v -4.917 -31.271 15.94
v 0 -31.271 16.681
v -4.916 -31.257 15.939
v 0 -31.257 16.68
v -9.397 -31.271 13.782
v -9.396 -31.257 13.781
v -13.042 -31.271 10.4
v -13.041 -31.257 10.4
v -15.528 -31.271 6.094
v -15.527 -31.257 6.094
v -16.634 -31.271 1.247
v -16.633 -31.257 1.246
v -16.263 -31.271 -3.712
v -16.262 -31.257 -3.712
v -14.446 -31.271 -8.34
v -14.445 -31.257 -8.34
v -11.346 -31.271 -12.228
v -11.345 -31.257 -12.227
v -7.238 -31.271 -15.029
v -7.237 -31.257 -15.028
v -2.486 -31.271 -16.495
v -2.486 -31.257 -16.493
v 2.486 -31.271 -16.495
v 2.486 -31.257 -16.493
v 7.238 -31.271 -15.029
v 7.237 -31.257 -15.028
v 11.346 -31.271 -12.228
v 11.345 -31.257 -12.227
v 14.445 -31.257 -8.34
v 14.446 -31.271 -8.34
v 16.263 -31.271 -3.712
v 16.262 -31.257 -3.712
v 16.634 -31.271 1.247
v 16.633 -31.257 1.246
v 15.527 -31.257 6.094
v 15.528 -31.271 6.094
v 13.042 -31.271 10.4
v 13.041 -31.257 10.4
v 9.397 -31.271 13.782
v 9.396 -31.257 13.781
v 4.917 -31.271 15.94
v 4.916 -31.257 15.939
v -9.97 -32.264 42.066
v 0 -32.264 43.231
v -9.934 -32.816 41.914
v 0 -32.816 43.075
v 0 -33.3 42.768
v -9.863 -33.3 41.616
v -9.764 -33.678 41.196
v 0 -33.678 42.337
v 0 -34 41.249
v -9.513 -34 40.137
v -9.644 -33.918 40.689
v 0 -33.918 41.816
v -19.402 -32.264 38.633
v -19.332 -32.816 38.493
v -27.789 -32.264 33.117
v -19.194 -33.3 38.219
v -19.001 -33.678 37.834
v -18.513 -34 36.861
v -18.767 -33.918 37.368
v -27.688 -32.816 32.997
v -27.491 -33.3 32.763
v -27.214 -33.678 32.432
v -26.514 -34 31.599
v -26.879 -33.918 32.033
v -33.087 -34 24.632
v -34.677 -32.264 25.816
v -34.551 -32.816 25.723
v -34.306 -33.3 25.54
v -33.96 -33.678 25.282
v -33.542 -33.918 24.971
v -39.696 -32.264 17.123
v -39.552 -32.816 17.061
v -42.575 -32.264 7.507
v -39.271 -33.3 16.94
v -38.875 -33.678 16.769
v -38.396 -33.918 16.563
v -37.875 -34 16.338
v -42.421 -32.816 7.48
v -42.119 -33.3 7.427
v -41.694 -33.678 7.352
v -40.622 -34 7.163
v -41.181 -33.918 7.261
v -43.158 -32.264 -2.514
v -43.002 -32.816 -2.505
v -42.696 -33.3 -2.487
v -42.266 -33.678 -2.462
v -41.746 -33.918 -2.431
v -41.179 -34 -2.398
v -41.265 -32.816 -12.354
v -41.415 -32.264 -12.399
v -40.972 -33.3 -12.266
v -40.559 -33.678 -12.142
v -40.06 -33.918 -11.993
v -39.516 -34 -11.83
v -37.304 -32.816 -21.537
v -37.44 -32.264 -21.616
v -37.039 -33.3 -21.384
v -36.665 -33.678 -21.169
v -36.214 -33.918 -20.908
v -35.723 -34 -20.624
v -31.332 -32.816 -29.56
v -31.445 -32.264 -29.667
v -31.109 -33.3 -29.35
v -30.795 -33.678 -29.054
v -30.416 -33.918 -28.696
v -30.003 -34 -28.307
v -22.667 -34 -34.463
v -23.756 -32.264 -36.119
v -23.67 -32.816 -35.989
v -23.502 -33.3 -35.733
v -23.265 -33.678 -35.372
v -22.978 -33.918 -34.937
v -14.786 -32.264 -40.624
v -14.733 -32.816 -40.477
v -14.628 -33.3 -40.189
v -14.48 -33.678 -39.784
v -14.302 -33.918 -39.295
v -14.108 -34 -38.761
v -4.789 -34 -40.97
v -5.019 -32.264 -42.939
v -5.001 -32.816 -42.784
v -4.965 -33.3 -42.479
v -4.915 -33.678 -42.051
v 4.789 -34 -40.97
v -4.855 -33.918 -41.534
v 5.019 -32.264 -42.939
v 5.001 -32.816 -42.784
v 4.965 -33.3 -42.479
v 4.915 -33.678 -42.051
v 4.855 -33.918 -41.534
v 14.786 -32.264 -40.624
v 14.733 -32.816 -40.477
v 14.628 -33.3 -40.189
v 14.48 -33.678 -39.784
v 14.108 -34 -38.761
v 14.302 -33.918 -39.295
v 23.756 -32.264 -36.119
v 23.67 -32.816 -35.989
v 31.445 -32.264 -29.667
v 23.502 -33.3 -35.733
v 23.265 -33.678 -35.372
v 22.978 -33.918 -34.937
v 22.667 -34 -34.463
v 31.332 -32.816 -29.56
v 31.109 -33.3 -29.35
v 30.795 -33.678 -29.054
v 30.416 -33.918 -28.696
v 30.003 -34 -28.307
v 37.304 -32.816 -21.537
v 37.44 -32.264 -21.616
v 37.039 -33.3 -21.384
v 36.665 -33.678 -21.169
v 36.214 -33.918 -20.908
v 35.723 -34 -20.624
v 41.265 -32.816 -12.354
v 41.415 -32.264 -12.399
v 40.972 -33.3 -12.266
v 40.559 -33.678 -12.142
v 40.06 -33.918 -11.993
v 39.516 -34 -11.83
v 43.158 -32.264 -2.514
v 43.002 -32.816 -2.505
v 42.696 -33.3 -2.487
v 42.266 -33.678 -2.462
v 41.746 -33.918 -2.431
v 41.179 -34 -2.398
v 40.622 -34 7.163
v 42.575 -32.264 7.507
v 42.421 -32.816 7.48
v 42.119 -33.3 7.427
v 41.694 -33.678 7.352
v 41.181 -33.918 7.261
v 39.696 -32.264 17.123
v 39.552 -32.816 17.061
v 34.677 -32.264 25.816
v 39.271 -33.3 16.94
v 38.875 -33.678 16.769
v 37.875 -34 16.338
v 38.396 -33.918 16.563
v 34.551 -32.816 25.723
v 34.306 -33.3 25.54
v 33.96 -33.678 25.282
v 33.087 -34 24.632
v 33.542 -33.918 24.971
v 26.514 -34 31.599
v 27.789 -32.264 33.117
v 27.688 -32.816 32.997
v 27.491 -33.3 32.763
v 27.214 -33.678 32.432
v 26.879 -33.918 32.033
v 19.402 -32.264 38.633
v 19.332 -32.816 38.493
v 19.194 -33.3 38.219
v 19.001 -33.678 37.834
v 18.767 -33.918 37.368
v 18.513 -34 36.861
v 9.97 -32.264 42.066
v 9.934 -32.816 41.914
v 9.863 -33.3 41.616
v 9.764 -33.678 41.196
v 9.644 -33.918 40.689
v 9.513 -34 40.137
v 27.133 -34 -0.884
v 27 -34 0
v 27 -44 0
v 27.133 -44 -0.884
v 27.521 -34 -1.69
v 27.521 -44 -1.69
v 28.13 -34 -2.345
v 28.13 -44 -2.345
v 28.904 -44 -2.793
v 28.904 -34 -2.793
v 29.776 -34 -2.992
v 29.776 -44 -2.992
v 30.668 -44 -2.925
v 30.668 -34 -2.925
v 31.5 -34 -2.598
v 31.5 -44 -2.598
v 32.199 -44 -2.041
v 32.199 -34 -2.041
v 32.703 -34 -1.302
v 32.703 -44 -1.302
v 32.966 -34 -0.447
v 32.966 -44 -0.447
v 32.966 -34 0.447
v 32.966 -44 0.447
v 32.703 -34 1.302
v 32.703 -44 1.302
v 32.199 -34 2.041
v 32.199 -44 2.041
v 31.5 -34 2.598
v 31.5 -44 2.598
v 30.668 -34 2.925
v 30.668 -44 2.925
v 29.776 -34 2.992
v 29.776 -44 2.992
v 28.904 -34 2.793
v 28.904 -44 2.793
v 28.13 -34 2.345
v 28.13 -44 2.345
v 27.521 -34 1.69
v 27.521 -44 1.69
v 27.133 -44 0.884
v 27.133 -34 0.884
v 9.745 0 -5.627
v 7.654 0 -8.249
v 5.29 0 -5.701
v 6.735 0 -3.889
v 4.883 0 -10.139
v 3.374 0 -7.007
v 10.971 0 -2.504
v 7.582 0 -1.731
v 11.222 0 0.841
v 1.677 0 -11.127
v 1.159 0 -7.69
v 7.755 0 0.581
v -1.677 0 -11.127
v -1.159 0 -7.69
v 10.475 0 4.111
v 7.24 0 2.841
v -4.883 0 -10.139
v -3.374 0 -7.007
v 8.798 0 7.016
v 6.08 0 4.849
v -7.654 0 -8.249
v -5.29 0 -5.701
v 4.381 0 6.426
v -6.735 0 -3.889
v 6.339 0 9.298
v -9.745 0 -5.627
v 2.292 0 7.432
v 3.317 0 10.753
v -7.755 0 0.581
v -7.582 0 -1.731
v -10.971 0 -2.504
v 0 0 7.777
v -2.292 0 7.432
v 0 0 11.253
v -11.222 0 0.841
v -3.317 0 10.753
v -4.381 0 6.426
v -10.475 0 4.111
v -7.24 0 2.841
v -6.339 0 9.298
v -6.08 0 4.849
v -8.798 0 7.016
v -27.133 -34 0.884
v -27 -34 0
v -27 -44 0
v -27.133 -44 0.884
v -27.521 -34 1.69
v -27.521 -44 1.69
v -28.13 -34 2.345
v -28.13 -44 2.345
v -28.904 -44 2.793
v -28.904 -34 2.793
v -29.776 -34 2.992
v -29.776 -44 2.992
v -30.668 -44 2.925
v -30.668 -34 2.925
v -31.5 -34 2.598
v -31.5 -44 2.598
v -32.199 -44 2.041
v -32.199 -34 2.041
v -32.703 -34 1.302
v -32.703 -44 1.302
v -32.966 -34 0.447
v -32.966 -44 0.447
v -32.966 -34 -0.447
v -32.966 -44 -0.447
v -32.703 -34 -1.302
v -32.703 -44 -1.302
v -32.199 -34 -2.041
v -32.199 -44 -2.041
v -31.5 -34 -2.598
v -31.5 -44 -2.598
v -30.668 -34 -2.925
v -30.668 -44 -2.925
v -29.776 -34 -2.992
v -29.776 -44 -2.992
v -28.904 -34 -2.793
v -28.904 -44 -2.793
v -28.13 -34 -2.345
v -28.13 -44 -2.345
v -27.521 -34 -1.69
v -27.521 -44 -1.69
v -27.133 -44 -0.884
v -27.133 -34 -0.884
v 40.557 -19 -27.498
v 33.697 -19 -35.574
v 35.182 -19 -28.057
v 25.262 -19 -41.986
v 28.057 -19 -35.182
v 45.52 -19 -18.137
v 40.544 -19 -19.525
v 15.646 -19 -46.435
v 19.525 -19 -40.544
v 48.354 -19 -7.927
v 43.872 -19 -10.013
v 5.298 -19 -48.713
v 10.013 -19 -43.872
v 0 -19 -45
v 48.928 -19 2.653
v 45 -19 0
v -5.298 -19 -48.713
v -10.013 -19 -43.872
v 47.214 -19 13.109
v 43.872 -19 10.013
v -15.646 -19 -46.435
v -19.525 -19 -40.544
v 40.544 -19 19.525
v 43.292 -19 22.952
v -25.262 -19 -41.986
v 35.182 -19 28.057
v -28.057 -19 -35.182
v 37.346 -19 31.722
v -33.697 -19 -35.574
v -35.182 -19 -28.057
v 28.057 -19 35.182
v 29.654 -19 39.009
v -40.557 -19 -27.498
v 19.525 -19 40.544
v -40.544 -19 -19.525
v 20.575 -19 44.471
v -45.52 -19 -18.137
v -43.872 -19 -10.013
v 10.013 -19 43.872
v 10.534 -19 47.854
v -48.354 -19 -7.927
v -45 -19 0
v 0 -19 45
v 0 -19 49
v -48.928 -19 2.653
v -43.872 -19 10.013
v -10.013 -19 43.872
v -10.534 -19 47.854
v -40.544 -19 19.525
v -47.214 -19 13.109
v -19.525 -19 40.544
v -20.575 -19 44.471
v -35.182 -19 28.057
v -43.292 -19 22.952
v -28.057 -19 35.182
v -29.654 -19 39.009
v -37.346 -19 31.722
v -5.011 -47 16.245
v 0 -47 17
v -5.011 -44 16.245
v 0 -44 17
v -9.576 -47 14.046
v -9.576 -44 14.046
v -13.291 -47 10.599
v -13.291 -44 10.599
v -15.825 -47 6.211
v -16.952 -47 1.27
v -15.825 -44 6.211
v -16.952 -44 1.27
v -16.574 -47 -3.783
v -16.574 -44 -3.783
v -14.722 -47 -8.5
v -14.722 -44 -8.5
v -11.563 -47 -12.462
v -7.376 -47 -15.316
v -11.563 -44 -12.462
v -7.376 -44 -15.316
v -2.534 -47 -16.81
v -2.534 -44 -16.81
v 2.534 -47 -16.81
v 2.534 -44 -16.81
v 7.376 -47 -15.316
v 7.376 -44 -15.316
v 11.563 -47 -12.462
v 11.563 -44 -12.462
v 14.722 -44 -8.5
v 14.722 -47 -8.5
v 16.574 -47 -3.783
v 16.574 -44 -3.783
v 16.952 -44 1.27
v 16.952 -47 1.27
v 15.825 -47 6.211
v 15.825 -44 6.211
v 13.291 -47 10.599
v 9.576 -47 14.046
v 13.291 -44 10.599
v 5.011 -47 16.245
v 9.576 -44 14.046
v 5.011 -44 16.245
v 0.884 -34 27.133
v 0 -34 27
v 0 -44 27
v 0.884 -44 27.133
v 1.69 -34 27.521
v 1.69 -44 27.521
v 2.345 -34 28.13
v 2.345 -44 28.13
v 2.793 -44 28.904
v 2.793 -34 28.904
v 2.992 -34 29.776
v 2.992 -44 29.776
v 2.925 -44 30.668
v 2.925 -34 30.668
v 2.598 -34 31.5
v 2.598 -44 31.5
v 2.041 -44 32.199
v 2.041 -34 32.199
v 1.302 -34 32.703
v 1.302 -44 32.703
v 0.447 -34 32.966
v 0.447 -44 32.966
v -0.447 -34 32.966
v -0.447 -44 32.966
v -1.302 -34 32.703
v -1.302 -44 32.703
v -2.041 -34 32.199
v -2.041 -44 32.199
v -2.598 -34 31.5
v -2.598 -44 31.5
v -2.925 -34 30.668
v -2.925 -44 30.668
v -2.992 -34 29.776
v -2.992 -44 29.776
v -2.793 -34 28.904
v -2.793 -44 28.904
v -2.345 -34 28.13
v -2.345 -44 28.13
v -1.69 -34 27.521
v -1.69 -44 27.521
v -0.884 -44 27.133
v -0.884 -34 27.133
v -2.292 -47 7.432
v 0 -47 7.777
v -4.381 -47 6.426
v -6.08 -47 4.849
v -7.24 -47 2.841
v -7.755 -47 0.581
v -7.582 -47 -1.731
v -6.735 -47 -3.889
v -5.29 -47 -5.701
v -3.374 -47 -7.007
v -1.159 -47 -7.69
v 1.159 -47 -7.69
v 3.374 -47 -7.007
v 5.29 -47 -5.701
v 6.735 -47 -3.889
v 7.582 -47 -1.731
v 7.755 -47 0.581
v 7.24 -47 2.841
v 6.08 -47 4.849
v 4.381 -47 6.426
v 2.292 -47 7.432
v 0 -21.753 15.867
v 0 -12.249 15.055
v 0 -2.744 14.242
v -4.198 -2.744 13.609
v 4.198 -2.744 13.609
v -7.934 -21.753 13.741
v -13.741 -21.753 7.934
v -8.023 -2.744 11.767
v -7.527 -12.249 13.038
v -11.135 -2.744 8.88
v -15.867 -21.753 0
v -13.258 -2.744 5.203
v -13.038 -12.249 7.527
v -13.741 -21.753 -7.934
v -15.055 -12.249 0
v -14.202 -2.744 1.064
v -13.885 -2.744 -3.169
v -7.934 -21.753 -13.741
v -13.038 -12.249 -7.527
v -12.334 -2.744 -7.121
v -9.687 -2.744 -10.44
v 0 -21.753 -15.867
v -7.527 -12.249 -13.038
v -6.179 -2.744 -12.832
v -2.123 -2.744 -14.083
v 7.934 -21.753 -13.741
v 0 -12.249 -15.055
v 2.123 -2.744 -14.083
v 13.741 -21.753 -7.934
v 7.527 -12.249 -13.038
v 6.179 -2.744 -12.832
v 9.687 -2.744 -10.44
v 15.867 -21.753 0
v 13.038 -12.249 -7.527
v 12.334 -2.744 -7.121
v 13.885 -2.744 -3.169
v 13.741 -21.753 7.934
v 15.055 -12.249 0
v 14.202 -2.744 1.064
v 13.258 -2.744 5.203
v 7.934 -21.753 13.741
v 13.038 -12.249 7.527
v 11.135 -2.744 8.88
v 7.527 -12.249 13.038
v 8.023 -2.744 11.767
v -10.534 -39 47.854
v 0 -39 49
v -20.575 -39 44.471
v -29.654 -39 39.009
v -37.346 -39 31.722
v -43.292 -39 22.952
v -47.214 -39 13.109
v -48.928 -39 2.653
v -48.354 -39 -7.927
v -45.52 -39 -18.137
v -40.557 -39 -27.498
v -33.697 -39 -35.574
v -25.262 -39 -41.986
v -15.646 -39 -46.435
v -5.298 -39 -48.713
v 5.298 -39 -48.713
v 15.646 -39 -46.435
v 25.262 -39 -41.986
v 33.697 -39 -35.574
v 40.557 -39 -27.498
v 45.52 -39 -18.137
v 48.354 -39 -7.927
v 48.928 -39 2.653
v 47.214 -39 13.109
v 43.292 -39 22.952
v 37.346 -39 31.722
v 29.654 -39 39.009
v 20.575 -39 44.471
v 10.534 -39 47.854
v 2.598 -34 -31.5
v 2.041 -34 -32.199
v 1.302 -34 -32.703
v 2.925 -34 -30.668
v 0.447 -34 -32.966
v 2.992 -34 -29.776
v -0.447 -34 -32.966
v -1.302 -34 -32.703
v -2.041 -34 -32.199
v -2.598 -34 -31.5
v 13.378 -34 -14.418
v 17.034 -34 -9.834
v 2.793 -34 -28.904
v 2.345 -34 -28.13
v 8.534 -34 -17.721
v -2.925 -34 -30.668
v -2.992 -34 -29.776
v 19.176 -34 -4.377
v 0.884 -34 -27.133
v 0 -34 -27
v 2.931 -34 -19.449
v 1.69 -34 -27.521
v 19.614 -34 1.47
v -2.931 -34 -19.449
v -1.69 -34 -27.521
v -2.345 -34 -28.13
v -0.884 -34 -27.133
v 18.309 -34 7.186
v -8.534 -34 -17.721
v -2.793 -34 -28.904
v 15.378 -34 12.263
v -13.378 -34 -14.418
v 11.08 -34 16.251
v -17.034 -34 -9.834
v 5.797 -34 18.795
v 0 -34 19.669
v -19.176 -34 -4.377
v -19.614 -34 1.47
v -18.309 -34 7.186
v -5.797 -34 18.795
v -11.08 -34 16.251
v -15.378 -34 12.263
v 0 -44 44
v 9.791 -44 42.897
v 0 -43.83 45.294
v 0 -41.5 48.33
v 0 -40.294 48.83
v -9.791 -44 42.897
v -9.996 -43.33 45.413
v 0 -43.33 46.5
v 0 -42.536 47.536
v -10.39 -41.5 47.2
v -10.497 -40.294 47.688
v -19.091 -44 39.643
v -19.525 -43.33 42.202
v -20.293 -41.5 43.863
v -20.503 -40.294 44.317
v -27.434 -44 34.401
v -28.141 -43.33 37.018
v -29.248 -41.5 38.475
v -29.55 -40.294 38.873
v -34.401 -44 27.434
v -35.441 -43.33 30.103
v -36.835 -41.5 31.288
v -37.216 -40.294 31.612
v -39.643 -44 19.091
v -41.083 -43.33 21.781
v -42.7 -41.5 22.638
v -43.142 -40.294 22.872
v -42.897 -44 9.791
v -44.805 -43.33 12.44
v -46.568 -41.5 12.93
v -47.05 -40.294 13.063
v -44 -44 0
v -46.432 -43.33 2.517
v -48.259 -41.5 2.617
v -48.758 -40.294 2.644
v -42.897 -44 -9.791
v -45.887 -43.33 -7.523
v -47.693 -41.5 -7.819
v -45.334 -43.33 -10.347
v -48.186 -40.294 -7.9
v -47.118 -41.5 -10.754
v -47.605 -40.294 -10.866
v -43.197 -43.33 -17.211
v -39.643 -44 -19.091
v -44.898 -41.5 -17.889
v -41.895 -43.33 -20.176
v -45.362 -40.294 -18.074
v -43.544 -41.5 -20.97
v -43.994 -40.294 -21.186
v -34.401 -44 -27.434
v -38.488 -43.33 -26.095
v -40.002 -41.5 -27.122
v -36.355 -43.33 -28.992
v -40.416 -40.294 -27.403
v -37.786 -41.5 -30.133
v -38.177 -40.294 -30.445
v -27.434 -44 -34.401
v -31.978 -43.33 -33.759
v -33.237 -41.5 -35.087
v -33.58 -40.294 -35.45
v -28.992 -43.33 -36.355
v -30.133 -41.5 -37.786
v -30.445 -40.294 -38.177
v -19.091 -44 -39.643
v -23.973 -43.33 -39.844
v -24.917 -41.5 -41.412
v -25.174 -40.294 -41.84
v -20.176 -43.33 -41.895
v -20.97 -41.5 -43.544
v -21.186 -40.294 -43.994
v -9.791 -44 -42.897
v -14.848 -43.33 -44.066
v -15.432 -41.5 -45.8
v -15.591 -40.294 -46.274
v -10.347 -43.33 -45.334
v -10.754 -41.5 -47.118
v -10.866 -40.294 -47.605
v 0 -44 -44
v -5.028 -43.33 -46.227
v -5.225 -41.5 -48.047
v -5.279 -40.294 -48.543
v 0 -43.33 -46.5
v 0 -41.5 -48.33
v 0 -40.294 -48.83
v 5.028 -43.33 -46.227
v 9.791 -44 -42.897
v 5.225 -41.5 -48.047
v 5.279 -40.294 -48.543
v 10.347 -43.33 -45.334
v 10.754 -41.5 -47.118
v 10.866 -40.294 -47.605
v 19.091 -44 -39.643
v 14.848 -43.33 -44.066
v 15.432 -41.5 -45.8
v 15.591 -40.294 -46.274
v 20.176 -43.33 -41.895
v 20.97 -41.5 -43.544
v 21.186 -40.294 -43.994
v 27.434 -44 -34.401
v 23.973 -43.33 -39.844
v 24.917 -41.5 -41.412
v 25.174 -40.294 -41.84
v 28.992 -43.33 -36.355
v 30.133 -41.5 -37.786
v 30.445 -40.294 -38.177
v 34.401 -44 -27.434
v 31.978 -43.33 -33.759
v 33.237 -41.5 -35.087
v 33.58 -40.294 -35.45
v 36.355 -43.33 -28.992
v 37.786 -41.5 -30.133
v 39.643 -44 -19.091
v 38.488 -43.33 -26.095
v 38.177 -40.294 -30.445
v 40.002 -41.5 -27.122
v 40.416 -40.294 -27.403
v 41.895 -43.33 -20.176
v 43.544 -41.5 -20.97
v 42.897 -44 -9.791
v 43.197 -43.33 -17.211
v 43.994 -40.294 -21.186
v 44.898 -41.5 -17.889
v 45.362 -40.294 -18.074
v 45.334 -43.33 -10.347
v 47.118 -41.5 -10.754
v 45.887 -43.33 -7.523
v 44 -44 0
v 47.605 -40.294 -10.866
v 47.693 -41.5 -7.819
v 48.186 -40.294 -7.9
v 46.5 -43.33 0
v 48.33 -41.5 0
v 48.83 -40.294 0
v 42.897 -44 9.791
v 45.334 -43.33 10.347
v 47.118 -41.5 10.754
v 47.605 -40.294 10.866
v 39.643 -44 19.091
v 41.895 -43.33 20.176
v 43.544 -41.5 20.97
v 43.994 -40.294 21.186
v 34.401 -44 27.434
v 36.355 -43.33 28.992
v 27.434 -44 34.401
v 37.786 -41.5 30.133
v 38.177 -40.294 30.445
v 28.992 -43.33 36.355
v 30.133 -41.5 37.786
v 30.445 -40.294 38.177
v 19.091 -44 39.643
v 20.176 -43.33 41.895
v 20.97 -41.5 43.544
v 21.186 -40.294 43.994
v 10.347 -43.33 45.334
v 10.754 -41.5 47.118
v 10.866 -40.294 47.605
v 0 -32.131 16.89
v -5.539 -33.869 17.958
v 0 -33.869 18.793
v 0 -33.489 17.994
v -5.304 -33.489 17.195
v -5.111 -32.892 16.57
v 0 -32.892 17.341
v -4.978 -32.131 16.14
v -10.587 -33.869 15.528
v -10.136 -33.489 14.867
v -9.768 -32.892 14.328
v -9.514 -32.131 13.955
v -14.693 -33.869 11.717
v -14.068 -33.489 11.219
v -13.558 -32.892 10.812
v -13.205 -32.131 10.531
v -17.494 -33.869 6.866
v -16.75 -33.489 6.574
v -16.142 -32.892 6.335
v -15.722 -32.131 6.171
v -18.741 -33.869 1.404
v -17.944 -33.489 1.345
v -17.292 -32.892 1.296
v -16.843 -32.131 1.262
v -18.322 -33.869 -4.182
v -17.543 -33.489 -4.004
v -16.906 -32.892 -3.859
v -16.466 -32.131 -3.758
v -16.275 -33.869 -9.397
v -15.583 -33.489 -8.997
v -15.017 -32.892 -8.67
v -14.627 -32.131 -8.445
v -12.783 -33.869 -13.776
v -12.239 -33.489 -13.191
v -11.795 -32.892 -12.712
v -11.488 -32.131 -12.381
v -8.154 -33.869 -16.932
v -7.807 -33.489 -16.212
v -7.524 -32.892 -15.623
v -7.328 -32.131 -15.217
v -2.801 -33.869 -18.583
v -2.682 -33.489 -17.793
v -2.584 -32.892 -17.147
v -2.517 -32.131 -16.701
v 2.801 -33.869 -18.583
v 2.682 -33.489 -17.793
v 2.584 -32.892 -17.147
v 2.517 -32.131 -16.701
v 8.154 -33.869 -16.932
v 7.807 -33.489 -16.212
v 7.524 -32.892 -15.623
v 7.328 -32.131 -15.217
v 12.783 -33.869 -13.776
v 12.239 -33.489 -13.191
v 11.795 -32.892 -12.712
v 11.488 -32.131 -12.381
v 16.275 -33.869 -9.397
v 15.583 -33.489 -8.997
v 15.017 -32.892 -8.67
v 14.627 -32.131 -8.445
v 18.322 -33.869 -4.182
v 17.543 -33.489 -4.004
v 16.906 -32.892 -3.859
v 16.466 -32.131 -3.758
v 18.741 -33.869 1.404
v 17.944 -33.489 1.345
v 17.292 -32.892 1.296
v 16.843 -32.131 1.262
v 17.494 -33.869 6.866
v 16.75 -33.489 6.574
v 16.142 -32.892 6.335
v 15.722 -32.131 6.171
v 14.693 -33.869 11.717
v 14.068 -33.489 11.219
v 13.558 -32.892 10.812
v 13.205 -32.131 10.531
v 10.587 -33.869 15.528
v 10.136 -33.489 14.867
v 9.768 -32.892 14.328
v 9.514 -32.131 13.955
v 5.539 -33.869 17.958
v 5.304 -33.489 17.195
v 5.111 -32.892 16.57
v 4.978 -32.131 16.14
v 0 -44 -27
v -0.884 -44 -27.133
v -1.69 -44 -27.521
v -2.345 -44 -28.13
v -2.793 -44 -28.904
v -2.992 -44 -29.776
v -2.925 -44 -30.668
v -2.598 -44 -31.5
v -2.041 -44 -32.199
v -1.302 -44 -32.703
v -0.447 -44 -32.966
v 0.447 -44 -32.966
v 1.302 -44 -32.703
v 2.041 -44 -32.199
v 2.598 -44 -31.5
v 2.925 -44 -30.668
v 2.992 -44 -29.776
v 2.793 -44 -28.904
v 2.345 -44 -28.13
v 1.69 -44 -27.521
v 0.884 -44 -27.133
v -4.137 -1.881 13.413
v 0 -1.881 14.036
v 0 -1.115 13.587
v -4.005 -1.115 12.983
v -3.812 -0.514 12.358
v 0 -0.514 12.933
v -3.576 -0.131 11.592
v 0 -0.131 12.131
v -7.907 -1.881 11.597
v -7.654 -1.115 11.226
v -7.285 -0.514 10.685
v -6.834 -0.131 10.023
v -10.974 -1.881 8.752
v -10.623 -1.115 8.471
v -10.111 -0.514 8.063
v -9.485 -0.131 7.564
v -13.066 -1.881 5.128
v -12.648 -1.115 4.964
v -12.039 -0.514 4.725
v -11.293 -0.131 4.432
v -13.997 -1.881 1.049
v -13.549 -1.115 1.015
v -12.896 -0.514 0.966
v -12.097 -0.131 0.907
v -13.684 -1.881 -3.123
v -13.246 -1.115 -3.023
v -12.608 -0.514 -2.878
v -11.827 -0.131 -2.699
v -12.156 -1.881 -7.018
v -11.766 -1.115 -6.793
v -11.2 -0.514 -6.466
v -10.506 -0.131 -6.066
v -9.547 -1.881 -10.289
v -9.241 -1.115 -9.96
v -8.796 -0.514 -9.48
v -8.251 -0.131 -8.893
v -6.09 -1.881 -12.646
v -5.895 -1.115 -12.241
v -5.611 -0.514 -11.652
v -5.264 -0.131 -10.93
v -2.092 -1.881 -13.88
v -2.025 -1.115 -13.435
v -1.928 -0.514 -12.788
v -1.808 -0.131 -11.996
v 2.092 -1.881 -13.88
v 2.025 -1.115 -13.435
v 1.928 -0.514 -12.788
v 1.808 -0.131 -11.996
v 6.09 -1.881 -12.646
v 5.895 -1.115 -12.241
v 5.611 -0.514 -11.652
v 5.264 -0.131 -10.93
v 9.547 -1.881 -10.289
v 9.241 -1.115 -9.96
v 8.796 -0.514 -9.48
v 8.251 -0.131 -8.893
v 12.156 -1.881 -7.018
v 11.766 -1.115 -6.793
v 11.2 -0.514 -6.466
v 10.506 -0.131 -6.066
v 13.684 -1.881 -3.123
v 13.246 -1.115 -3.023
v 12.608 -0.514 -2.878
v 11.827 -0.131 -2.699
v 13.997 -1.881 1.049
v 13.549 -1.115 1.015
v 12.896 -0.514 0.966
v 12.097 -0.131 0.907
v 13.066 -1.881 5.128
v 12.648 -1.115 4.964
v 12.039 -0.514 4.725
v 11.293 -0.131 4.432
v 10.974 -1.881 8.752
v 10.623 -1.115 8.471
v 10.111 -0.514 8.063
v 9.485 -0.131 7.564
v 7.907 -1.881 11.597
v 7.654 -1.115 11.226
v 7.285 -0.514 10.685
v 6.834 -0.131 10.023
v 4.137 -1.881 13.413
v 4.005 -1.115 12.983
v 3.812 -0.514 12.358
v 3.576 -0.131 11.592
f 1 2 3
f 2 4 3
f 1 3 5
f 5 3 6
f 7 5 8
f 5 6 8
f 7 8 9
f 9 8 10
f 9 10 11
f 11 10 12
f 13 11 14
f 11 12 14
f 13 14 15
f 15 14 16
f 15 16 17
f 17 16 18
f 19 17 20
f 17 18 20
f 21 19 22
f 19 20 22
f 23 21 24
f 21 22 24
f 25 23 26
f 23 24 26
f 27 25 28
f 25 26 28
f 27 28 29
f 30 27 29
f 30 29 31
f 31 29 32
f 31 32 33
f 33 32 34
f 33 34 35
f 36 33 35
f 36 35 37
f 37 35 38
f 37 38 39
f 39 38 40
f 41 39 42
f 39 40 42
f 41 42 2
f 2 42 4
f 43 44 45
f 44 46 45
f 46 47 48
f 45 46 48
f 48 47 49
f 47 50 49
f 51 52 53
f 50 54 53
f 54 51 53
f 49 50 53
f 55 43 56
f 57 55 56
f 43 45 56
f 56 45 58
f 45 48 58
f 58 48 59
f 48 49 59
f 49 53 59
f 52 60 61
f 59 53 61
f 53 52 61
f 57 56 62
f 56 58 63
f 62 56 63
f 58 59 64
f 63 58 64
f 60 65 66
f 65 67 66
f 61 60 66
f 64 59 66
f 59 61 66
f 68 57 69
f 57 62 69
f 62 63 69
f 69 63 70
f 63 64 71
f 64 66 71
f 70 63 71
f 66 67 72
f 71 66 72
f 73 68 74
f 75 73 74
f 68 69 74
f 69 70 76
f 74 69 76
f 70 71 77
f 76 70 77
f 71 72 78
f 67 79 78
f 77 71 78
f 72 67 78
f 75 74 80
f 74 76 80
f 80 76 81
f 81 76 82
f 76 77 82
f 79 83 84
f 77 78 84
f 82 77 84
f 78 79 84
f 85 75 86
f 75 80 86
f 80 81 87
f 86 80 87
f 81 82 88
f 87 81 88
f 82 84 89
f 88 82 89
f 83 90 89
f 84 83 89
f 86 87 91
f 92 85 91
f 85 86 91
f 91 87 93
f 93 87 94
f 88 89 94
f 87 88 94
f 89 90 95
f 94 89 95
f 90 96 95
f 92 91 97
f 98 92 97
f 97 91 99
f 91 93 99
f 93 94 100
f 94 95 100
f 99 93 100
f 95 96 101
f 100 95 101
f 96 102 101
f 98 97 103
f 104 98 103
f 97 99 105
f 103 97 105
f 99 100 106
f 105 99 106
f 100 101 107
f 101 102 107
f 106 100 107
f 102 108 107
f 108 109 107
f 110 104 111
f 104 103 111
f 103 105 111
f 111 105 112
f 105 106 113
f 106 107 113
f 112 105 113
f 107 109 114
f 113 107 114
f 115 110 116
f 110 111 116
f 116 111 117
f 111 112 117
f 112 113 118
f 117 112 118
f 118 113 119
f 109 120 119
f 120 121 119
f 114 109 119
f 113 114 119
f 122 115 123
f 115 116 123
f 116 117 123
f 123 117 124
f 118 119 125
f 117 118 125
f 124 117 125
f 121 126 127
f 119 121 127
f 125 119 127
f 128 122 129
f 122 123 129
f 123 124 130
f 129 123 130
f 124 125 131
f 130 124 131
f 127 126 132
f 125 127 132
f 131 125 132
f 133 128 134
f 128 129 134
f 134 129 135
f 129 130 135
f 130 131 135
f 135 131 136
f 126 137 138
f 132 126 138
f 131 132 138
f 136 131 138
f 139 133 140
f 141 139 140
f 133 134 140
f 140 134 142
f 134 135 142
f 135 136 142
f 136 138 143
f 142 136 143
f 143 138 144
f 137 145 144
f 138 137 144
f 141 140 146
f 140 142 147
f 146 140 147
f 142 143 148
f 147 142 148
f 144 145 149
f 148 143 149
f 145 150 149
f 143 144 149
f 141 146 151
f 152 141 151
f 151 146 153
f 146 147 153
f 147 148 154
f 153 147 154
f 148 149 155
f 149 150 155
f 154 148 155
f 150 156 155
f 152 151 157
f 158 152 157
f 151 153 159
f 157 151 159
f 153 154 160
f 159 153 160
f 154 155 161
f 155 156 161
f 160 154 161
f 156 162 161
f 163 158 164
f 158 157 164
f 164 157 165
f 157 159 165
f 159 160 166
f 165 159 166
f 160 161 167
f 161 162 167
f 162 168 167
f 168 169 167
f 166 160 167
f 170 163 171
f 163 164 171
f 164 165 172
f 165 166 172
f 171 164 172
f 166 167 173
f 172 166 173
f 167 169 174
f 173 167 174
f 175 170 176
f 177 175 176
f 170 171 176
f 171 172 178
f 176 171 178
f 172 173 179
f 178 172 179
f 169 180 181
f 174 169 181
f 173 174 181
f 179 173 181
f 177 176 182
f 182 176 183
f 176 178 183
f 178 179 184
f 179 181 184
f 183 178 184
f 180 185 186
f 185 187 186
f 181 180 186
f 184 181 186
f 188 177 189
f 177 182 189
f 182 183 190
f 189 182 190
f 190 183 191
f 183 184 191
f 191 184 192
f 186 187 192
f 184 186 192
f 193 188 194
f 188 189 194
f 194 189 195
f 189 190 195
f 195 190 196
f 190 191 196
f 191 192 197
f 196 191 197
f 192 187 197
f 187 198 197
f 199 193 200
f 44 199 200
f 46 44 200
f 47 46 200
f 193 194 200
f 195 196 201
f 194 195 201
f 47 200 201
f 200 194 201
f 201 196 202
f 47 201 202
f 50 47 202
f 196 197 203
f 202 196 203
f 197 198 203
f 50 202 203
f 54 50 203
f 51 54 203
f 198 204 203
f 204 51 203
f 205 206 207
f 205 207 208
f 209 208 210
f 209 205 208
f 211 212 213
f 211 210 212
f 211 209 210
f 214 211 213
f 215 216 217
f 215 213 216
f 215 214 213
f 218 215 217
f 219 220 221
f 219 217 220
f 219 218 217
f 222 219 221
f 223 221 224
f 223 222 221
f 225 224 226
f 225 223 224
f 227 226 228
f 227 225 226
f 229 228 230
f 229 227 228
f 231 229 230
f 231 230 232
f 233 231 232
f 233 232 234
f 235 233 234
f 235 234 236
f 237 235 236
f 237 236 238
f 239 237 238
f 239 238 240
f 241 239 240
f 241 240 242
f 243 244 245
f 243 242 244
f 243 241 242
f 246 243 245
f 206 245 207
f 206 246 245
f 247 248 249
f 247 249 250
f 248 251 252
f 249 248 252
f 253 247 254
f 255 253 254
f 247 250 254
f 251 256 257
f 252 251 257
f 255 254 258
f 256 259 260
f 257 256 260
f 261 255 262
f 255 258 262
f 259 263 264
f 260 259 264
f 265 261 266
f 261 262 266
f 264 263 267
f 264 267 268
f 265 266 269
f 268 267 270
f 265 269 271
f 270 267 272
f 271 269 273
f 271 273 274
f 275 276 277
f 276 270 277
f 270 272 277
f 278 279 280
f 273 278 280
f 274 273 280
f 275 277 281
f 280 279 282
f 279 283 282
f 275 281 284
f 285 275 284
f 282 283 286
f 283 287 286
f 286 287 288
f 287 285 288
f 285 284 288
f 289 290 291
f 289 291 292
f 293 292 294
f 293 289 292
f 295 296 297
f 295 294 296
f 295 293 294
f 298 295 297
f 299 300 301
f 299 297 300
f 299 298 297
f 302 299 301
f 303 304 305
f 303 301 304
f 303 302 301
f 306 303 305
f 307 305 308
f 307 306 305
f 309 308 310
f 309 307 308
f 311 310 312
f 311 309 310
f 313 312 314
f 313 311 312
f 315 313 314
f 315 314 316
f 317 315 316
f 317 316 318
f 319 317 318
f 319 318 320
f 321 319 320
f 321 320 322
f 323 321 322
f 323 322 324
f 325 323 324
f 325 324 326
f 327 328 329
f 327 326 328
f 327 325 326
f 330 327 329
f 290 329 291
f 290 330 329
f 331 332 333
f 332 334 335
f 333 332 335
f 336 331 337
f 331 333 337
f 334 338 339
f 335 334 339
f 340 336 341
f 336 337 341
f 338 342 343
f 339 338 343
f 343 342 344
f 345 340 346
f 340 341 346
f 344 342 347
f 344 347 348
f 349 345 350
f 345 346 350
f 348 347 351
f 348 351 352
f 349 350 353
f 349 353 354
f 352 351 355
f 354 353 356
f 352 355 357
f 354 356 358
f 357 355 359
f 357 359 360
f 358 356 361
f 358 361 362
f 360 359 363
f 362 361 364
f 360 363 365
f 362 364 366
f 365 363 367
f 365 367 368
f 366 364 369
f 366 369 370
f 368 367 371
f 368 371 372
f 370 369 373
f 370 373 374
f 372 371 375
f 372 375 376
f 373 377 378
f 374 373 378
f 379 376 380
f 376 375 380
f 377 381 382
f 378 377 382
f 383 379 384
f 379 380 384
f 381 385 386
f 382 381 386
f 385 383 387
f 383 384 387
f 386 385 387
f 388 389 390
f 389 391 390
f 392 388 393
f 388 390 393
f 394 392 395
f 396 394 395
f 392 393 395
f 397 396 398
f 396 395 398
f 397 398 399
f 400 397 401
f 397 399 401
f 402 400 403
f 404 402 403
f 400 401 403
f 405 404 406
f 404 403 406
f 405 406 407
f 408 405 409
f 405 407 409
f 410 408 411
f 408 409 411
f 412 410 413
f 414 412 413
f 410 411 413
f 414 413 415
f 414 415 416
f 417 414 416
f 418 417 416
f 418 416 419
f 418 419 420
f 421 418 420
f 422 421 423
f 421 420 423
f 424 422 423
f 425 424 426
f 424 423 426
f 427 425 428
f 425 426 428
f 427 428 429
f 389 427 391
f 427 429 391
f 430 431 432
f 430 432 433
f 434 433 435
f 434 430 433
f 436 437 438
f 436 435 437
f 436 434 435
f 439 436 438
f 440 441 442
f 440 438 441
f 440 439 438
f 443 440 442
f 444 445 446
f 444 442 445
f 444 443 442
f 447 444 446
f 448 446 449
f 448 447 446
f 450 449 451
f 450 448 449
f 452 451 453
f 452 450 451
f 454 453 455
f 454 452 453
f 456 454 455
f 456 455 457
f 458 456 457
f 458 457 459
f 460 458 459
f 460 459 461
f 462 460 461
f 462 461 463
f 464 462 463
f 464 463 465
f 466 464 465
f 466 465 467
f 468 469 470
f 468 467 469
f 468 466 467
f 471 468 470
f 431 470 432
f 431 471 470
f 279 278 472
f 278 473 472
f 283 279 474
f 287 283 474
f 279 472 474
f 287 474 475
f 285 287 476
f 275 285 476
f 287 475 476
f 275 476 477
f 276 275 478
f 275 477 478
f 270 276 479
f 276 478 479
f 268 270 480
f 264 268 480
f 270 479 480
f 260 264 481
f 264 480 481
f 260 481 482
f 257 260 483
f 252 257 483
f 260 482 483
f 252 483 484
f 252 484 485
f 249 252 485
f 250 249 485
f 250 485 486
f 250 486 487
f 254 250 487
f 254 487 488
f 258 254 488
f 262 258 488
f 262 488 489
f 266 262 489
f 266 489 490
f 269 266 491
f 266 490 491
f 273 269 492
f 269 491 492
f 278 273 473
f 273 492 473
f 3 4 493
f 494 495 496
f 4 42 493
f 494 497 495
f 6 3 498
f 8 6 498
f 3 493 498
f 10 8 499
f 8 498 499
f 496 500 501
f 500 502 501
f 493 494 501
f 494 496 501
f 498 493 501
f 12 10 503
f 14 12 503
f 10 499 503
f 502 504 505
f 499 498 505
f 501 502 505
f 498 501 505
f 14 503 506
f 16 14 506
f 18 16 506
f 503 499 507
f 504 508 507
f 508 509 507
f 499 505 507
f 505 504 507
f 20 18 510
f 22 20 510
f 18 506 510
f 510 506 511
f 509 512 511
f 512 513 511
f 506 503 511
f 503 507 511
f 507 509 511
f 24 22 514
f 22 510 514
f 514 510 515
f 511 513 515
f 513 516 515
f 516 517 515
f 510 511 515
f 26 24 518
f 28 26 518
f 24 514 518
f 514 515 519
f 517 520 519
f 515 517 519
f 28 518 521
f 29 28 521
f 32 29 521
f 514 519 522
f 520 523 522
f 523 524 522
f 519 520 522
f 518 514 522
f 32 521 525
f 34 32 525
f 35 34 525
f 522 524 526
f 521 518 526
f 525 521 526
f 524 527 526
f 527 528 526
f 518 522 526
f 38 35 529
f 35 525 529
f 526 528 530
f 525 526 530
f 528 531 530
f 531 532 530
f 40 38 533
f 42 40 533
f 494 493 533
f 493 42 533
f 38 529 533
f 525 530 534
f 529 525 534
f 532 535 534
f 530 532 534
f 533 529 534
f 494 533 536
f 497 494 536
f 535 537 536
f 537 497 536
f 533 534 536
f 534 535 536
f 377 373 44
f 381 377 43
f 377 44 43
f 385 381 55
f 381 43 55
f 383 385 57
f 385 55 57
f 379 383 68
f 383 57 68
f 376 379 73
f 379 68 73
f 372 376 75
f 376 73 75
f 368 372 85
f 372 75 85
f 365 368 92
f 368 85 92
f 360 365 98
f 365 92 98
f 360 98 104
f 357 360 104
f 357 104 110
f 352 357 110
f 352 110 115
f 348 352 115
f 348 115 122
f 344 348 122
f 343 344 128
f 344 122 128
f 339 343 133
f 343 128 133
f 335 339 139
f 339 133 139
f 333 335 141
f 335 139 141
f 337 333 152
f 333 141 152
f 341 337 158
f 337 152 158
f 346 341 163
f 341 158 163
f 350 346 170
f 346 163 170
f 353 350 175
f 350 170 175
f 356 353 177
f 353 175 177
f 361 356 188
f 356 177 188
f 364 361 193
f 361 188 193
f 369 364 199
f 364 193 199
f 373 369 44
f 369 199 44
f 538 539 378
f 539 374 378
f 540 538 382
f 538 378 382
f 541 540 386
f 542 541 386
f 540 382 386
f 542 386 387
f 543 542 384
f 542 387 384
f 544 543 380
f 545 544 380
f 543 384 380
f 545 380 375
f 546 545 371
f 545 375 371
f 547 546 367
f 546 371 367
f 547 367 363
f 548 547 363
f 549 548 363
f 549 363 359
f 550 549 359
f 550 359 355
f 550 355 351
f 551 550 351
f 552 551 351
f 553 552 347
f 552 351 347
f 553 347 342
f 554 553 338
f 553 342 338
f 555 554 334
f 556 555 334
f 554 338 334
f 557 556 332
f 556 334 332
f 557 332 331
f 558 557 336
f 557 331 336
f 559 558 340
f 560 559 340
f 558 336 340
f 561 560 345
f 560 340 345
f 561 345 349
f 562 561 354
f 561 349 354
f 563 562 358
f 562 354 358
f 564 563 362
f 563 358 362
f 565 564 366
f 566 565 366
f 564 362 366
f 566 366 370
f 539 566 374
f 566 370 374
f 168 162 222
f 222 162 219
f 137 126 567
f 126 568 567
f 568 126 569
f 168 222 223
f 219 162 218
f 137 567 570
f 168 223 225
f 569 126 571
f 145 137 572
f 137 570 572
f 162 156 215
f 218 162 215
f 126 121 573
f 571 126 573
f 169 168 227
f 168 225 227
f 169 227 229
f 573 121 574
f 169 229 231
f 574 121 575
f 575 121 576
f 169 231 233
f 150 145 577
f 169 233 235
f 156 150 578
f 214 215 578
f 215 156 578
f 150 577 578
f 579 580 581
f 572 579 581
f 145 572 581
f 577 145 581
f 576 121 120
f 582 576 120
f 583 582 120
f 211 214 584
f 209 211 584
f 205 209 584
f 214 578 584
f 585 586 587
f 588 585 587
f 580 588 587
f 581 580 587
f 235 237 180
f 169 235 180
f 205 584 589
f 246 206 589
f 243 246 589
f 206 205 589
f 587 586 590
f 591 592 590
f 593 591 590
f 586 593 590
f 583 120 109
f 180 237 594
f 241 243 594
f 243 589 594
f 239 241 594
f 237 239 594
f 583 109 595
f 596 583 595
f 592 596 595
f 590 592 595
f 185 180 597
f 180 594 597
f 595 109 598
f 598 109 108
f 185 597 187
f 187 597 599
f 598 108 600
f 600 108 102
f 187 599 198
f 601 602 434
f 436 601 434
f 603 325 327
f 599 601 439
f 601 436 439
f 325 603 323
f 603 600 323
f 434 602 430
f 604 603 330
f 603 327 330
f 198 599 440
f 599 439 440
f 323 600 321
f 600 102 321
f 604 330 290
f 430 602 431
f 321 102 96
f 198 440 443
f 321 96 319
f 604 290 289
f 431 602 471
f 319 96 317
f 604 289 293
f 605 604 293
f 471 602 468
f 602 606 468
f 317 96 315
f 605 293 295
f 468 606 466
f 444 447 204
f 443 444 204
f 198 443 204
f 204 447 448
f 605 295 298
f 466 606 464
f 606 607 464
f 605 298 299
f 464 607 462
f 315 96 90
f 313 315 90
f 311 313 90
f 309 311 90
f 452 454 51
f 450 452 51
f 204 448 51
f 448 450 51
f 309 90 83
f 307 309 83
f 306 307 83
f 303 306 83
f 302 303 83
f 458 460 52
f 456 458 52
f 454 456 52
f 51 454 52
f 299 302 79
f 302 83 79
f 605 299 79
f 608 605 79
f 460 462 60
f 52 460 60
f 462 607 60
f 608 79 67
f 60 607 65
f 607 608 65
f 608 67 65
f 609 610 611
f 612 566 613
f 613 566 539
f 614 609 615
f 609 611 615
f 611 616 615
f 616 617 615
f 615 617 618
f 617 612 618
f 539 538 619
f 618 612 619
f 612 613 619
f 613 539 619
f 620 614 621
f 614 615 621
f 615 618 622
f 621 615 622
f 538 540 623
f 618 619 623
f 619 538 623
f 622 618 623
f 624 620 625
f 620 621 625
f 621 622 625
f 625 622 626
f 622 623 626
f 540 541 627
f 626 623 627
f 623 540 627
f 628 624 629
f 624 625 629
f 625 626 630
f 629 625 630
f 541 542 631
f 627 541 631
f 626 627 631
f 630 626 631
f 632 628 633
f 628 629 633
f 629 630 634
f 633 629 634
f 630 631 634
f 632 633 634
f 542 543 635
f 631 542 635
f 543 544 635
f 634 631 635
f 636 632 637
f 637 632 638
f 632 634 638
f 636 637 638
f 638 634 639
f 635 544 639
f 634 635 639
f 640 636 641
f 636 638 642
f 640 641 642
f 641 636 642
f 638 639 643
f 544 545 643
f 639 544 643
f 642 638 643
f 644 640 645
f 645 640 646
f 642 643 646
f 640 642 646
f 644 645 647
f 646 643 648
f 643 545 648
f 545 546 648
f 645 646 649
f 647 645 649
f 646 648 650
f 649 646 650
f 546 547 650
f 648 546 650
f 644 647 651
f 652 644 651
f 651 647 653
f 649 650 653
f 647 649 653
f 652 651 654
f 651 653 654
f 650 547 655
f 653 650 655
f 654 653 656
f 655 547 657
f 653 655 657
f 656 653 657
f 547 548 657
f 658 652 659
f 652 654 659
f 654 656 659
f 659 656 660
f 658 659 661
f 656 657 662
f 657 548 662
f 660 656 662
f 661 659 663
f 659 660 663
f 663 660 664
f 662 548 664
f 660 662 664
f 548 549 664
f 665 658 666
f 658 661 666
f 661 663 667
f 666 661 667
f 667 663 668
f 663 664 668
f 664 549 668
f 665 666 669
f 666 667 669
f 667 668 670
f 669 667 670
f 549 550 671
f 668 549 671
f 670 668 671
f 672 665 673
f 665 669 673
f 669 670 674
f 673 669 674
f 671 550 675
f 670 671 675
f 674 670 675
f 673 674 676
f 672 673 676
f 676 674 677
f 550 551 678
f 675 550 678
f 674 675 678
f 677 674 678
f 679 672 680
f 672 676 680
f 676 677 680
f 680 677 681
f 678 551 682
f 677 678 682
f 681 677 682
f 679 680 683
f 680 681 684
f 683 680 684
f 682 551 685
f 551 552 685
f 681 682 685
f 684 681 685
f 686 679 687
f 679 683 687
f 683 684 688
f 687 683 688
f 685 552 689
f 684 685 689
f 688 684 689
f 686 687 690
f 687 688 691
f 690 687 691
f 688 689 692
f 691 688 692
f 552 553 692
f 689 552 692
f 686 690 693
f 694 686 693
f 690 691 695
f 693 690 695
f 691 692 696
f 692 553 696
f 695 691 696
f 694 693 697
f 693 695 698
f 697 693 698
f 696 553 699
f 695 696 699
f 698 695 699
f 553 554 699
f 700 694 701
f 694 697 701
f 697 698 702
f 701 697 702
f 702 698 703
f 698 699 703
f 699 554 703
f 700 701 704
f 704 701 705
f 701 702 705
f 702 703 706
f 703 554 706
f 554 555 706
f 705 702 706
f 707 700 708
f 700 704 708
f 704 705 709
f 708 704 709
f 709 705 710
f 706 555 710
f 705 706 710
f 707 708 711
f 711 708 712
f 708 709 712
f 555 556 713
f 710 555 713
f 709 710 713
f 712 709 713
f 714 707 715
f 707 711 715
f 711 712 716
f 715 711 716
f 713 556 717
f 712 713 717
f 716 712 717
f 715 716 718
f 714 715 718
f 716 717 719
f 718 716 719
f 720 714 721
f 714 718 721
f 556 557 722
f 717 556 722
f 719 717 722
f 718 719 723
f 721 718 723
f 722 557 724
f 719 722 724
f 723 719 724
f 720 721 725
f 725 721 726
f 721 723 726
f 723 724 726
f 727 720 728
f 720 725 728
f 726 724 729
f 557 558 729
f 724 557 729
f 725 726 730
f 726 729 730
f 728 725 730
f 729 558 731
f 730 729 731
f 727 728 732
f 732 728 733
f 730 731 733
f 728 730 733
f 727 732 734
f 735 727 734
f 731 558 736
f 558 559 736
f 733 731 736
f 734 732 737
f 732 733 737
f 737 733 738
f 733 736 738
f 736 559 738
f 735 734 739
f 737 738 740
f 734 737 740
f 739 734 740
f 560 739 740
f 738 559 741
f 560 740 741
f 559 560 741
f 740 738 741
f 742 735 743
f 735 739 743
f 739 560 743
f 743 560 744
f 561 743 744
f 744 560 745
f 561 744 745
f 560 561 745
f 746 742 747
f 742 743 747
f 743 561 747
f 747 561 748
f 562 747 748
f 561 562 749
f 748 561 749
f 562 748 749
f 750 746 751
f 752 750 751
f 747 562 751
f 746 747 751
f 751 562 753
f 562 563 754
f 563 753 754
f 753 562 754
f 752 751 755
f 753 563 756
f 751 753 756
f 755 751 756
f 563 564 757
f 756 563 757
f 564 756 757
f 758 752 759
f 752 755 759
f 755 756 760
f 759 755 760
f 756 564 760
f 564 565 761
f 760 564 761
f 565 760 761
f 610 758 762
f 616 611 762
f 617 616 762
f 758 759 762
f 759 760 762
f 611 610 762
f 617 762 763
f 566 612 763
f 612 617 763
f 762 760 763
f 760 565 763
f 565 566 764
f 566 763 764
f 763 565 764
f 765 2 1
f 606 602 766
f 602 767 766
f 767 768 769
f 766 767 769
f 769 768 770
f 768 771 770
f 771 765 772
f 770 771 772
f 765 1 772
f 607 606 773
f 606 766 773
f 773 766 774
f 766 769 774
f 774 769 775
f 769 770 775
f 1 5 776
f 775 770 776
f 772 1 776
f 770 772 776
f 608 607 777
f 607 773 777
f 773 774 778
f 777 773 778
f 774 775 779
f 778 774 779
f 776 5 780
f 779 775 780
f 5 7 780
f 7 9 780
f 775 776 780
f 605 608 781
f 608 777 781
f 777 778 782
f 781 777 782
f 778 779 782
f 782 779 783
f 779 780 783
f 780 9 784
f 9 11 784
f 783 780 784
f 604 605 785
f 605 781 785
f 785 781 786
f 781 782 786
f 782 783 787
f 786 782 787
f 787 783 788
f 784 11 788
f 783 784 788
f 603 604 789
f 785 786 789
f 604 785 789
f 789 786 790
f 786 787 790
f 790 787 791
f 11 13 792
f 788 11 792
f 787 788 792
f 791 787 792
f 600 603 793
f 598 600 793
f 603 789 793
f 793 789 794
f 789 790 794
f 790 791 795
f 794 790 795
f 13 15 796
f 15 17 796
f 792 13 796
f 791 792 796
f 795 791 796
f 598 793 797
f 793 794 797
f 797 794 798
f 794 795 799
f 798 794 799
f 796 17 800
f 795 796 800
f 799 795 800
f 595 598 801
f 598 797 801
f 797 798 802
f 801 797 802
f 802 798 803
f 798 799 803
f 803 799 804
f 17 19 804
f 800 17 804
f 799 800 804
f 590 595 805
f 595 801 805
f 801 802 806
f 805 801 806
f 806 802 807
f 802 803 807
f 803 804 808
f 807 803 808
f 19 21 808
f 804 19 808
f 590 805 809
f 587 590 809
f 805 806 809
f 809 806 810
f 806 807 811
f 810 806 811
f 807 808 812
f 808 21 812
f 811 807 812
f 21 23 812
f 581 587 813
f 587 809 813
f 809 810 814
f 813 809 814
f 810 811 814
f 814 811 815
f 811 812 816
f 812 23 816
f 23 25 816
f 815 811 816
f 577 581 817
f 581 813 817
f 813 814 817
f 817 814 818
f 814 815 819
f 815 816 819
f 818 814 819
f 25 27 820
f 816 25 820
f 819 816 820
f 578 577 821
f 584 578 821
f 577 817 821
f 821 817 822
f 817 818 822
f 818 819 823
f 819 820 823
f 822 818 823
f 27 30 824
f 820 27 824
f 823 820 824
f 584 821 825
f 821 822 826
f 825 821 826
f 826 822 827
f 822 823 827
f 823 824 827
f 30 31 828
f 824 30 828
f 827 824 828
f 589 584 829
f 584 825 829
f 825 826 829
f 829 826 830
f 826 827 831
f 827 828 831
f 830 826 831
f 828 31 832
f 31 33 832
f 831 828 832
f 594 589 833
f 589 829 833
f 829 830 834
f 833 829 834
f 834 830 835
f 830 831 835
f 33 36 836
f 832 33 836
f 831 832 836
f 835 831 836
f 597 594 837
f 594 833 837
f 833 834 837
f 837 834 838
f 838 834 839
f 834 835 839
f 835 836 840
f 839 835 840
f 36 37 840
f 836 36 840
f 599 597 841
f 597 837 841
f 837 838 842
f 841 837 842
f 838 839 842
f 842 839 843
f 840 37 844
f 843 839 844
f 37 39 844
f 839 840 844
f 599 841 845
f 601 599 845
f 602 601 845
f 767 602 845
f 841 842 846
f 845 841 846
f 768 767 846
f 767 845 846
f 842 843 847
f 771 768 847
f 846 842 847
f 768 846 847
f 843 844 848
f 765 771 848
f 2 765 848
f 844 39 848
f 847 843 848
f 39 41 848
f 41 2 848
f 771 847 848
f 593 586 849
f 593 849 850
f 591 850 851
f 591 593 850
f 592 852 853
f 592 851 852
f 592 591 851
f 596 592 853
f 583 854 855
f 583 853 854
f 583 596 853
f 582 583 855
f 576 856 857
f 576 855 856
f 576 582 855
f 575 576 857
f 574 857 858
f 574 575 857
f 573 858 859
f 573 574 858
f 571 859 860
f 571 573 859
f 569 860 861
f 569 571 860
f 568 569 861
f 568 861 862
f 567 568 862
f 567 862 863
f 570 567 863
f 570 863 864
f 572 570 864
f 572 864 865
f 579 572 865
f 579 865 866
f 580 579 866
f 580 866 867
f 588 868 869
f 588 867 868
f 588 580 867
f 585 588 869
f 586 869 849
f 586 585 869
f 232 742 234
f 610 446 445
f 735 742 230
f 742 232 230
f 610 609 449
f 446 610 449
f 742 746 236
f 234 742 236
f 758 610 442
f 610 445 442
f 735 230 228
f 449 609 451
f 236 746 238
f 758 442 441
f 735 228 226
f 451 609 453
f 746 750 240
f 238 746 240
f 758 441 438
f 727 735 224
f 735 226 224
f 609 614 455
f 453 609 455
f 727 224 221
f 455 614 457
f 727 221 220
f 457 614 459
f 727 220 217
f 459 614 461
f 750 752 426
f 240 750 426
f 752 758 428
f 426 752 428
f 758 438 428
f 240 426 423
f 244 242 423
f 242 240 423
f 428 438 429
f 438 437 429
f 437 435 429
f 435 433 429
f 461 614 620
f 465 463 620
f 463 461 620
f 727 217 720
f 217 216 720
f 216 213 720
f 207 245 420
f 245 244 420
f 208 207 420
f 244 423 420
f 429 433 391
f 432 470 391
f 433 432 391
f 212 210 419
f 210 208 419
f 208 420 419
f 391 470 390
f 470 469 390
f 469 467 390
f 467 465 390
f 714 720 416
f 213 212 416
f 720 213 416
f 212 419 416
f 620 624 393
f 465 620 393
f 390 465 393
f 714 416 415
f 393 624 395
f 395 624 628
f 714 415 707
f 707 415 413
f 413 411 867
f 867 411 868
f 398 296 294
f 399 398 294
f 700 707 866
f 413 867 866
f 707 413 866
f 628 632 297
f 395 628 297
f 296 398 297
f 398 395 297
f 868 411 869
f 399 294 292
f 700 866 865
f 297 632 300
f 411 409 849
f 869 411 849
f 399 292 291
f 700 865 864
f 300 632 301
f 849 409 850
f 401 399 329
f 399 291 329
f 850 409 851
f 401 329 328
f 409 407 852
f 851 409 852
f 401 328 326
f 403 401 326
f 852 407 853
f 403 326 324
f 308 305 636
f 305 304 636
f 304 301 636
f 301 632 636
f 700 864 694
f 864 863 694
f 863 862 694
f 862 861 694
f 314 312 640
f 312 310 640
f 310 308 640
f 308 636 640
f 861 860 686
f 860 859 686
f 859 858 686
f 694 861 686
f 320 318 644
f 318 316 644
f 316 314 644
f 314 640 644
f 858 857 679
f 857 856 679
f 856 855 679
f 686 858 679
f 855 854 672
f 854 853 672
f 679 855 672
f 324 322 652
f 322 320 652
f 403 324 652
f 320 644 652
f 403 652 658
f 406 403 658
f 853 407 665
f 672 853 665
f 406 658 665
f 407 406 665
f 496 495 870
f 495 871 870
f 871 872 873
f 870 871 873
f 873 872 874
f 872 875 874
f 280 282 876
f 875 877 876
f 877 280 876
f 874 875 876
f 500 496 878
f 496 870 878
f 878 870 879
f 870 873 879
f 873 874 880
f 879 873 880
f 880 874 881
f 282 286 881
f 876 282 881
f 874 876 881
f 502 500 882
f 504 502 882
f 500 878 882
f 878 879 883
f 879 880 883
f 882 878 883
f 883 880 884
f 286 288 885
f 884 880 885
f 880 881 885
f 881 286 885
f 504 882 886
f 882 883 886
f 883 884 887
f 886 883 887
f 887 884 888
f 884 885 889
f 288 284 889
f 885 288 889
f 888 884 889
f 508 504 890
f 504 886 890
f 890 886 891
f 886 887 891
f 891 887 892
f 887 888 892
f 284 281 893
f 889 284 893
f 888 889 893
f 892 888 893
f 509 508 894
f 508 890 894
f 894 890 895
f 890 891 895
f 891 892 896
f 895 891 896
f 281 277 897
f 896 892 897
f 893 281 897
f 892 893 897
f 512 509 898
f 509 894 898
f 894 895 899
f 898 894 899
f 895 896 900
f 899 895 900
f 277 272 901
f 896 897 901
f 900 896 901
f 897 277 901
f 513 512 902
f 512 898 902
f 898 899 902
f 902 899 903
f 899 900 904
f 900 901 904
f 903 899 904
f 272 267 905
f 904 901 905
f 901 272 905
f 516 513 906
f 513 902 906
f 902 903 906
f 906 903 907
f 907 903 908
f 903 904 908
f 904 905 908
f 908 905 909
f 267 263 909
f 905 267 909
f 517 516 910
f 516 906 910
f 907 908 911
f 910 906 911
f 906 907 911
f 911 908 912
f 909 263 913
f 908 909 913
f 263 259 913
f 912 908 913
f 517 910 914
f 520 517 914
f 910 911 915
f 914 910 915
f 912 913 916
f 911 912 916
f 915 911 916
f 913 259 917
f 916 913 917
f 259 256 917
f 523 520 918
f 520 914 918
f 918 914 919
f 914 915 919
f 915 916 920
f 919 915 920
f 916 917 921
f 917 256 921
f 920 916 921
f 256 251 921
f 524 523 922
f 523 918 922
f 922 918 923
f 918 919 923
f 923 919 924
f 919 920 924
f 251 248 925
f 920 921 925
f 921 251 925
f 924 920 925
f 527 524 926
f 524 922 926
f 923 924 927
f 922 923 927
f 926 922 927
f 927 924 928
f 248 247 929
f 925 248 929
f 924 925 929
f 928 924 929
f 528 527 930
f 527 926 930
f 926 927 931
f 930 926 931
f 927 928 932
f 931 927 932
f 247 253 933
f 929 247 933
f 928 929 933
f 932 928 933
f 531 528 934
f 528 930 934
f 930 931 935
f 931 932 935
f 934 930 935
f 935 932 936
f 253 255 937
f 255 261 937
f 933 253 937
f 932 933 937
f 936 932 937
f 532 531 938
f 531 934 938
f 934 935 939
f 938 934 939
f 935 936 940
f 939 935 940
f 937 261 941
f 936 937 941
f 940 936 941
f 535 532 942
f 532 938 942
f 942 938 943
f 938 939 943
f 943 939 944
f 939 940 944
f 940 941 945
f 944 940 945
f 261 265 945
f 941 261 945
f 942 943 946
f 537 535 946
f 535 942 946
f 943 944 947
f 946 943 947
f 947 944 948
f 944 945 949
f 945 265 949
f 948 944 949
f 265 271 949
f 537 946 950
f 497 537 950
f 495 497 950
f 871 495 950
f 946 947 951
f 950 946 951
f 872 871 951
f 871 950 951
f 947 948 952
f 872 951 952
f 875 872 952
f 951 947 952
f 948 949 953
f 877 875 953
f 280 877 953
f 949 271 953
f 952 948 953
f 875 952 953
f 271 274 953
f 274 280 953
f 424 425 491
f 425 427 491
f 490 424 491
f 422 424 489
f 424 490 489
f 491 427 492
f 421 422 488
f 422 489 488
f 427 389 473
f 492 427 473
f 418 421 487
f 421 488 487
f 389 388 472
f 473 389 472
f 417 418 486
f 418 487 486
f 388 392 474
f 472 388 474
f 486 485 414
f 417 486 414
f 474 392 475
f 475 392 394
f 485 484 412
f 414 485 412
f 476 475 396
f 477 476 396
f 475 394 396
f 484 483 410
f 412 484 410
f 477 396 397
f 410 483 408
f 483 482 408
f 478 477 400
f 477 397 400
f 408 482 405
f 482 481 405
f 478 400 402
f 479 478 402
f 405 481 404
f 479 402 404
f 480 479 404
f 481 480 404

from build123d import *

# Parameters (mm, degrees)
CUT_EXTRUDE2_START = -45
SKETCH6_R          = 3
CUT_EXTRUDE2_DEPTH = 49
CIRPATTERN2_COUNT  = 4


with BuildPart() as part:
    # Sketch3 → Revolve3 (revolve)
    with BuildSketch(Plane.XY, mode=Mode.PRIVATE) as revolve3_sk:
        with BuildLine():
            Line((-11.253050324, 0), (-7.777152082, 0))
            Line((-7.777152082, 0), (-7.777152082, -47))
            Line((-7.777152082, -47), (-17, -47))
            Line((-17, -47), (-17, -44))
            Line((-17, -44), (-44, -44))
            ThreePointArc((-44, -44), (-47.535533906, -42.535533906), (-49, -39))
            Line((-49, -39), (-49, -19))
            Line((-49, -19), (-45, -19))
            Line((-45, -19), (-43.231423008, -32.26432744))
            ThreePointArc((-43.231423008, -32.26432744), (-42.566416469, -33.504768235), (-41.248967207, -34))
            Line((-41.248967207, -34), (-19.668701252, -34))
            ThreePointArc((-19.668701252, -34), (-17.645287665, -33.214903487), (-16.680924046, -31.270531637))
            Line((-16.680924046, -31.270531637), (-16.679706085, -31.256728077))
            Line((-16.679706085, -31.256728077), (-14.242146839, -2.744457398))
            ThreePointArc((-14.242146839, -2.744457398), (-13.282012151, -0.790177857), (-11.253050324, 0))
        make_face()
    revolve(revolve3_sk.sketch.rotate(Axis((0, 0, 0), (0, -1, 0)), 270), axis=Axis((0, 0, 0), (0, -1, 0)))  # turned: the seam where the file's is

    # Sketch6 → Cut-Extrude2 (cut)
    with BuildSketch(Plane.XZ.offset(44).offset(CUT_EXTRUDE2_START)):
        with Locations(Location((0, 30, 0), (0, 0, 270))):  # turned: the seam where the file's is
            Circle(SKETCH6_R)
    cut_extrude2 = extrude(amount=CUT_EXTRUDE2_DEPTH, mode=Mode.SUBTRACT)

    # CirPattern2: Cut-Extrude2 ×4 about axis
    cirpattern2_axis = Axis((0, 0, 0), (0, 1, 0))
    for i in range(1, CIRPATTERN2_COUNT):
        add(cut_extrude2.rotate(cirpattern2_axis, i * 360 / CIRPATTERN2_COUNT), mode=Mode.SUBTRACT)


solid = part.part
